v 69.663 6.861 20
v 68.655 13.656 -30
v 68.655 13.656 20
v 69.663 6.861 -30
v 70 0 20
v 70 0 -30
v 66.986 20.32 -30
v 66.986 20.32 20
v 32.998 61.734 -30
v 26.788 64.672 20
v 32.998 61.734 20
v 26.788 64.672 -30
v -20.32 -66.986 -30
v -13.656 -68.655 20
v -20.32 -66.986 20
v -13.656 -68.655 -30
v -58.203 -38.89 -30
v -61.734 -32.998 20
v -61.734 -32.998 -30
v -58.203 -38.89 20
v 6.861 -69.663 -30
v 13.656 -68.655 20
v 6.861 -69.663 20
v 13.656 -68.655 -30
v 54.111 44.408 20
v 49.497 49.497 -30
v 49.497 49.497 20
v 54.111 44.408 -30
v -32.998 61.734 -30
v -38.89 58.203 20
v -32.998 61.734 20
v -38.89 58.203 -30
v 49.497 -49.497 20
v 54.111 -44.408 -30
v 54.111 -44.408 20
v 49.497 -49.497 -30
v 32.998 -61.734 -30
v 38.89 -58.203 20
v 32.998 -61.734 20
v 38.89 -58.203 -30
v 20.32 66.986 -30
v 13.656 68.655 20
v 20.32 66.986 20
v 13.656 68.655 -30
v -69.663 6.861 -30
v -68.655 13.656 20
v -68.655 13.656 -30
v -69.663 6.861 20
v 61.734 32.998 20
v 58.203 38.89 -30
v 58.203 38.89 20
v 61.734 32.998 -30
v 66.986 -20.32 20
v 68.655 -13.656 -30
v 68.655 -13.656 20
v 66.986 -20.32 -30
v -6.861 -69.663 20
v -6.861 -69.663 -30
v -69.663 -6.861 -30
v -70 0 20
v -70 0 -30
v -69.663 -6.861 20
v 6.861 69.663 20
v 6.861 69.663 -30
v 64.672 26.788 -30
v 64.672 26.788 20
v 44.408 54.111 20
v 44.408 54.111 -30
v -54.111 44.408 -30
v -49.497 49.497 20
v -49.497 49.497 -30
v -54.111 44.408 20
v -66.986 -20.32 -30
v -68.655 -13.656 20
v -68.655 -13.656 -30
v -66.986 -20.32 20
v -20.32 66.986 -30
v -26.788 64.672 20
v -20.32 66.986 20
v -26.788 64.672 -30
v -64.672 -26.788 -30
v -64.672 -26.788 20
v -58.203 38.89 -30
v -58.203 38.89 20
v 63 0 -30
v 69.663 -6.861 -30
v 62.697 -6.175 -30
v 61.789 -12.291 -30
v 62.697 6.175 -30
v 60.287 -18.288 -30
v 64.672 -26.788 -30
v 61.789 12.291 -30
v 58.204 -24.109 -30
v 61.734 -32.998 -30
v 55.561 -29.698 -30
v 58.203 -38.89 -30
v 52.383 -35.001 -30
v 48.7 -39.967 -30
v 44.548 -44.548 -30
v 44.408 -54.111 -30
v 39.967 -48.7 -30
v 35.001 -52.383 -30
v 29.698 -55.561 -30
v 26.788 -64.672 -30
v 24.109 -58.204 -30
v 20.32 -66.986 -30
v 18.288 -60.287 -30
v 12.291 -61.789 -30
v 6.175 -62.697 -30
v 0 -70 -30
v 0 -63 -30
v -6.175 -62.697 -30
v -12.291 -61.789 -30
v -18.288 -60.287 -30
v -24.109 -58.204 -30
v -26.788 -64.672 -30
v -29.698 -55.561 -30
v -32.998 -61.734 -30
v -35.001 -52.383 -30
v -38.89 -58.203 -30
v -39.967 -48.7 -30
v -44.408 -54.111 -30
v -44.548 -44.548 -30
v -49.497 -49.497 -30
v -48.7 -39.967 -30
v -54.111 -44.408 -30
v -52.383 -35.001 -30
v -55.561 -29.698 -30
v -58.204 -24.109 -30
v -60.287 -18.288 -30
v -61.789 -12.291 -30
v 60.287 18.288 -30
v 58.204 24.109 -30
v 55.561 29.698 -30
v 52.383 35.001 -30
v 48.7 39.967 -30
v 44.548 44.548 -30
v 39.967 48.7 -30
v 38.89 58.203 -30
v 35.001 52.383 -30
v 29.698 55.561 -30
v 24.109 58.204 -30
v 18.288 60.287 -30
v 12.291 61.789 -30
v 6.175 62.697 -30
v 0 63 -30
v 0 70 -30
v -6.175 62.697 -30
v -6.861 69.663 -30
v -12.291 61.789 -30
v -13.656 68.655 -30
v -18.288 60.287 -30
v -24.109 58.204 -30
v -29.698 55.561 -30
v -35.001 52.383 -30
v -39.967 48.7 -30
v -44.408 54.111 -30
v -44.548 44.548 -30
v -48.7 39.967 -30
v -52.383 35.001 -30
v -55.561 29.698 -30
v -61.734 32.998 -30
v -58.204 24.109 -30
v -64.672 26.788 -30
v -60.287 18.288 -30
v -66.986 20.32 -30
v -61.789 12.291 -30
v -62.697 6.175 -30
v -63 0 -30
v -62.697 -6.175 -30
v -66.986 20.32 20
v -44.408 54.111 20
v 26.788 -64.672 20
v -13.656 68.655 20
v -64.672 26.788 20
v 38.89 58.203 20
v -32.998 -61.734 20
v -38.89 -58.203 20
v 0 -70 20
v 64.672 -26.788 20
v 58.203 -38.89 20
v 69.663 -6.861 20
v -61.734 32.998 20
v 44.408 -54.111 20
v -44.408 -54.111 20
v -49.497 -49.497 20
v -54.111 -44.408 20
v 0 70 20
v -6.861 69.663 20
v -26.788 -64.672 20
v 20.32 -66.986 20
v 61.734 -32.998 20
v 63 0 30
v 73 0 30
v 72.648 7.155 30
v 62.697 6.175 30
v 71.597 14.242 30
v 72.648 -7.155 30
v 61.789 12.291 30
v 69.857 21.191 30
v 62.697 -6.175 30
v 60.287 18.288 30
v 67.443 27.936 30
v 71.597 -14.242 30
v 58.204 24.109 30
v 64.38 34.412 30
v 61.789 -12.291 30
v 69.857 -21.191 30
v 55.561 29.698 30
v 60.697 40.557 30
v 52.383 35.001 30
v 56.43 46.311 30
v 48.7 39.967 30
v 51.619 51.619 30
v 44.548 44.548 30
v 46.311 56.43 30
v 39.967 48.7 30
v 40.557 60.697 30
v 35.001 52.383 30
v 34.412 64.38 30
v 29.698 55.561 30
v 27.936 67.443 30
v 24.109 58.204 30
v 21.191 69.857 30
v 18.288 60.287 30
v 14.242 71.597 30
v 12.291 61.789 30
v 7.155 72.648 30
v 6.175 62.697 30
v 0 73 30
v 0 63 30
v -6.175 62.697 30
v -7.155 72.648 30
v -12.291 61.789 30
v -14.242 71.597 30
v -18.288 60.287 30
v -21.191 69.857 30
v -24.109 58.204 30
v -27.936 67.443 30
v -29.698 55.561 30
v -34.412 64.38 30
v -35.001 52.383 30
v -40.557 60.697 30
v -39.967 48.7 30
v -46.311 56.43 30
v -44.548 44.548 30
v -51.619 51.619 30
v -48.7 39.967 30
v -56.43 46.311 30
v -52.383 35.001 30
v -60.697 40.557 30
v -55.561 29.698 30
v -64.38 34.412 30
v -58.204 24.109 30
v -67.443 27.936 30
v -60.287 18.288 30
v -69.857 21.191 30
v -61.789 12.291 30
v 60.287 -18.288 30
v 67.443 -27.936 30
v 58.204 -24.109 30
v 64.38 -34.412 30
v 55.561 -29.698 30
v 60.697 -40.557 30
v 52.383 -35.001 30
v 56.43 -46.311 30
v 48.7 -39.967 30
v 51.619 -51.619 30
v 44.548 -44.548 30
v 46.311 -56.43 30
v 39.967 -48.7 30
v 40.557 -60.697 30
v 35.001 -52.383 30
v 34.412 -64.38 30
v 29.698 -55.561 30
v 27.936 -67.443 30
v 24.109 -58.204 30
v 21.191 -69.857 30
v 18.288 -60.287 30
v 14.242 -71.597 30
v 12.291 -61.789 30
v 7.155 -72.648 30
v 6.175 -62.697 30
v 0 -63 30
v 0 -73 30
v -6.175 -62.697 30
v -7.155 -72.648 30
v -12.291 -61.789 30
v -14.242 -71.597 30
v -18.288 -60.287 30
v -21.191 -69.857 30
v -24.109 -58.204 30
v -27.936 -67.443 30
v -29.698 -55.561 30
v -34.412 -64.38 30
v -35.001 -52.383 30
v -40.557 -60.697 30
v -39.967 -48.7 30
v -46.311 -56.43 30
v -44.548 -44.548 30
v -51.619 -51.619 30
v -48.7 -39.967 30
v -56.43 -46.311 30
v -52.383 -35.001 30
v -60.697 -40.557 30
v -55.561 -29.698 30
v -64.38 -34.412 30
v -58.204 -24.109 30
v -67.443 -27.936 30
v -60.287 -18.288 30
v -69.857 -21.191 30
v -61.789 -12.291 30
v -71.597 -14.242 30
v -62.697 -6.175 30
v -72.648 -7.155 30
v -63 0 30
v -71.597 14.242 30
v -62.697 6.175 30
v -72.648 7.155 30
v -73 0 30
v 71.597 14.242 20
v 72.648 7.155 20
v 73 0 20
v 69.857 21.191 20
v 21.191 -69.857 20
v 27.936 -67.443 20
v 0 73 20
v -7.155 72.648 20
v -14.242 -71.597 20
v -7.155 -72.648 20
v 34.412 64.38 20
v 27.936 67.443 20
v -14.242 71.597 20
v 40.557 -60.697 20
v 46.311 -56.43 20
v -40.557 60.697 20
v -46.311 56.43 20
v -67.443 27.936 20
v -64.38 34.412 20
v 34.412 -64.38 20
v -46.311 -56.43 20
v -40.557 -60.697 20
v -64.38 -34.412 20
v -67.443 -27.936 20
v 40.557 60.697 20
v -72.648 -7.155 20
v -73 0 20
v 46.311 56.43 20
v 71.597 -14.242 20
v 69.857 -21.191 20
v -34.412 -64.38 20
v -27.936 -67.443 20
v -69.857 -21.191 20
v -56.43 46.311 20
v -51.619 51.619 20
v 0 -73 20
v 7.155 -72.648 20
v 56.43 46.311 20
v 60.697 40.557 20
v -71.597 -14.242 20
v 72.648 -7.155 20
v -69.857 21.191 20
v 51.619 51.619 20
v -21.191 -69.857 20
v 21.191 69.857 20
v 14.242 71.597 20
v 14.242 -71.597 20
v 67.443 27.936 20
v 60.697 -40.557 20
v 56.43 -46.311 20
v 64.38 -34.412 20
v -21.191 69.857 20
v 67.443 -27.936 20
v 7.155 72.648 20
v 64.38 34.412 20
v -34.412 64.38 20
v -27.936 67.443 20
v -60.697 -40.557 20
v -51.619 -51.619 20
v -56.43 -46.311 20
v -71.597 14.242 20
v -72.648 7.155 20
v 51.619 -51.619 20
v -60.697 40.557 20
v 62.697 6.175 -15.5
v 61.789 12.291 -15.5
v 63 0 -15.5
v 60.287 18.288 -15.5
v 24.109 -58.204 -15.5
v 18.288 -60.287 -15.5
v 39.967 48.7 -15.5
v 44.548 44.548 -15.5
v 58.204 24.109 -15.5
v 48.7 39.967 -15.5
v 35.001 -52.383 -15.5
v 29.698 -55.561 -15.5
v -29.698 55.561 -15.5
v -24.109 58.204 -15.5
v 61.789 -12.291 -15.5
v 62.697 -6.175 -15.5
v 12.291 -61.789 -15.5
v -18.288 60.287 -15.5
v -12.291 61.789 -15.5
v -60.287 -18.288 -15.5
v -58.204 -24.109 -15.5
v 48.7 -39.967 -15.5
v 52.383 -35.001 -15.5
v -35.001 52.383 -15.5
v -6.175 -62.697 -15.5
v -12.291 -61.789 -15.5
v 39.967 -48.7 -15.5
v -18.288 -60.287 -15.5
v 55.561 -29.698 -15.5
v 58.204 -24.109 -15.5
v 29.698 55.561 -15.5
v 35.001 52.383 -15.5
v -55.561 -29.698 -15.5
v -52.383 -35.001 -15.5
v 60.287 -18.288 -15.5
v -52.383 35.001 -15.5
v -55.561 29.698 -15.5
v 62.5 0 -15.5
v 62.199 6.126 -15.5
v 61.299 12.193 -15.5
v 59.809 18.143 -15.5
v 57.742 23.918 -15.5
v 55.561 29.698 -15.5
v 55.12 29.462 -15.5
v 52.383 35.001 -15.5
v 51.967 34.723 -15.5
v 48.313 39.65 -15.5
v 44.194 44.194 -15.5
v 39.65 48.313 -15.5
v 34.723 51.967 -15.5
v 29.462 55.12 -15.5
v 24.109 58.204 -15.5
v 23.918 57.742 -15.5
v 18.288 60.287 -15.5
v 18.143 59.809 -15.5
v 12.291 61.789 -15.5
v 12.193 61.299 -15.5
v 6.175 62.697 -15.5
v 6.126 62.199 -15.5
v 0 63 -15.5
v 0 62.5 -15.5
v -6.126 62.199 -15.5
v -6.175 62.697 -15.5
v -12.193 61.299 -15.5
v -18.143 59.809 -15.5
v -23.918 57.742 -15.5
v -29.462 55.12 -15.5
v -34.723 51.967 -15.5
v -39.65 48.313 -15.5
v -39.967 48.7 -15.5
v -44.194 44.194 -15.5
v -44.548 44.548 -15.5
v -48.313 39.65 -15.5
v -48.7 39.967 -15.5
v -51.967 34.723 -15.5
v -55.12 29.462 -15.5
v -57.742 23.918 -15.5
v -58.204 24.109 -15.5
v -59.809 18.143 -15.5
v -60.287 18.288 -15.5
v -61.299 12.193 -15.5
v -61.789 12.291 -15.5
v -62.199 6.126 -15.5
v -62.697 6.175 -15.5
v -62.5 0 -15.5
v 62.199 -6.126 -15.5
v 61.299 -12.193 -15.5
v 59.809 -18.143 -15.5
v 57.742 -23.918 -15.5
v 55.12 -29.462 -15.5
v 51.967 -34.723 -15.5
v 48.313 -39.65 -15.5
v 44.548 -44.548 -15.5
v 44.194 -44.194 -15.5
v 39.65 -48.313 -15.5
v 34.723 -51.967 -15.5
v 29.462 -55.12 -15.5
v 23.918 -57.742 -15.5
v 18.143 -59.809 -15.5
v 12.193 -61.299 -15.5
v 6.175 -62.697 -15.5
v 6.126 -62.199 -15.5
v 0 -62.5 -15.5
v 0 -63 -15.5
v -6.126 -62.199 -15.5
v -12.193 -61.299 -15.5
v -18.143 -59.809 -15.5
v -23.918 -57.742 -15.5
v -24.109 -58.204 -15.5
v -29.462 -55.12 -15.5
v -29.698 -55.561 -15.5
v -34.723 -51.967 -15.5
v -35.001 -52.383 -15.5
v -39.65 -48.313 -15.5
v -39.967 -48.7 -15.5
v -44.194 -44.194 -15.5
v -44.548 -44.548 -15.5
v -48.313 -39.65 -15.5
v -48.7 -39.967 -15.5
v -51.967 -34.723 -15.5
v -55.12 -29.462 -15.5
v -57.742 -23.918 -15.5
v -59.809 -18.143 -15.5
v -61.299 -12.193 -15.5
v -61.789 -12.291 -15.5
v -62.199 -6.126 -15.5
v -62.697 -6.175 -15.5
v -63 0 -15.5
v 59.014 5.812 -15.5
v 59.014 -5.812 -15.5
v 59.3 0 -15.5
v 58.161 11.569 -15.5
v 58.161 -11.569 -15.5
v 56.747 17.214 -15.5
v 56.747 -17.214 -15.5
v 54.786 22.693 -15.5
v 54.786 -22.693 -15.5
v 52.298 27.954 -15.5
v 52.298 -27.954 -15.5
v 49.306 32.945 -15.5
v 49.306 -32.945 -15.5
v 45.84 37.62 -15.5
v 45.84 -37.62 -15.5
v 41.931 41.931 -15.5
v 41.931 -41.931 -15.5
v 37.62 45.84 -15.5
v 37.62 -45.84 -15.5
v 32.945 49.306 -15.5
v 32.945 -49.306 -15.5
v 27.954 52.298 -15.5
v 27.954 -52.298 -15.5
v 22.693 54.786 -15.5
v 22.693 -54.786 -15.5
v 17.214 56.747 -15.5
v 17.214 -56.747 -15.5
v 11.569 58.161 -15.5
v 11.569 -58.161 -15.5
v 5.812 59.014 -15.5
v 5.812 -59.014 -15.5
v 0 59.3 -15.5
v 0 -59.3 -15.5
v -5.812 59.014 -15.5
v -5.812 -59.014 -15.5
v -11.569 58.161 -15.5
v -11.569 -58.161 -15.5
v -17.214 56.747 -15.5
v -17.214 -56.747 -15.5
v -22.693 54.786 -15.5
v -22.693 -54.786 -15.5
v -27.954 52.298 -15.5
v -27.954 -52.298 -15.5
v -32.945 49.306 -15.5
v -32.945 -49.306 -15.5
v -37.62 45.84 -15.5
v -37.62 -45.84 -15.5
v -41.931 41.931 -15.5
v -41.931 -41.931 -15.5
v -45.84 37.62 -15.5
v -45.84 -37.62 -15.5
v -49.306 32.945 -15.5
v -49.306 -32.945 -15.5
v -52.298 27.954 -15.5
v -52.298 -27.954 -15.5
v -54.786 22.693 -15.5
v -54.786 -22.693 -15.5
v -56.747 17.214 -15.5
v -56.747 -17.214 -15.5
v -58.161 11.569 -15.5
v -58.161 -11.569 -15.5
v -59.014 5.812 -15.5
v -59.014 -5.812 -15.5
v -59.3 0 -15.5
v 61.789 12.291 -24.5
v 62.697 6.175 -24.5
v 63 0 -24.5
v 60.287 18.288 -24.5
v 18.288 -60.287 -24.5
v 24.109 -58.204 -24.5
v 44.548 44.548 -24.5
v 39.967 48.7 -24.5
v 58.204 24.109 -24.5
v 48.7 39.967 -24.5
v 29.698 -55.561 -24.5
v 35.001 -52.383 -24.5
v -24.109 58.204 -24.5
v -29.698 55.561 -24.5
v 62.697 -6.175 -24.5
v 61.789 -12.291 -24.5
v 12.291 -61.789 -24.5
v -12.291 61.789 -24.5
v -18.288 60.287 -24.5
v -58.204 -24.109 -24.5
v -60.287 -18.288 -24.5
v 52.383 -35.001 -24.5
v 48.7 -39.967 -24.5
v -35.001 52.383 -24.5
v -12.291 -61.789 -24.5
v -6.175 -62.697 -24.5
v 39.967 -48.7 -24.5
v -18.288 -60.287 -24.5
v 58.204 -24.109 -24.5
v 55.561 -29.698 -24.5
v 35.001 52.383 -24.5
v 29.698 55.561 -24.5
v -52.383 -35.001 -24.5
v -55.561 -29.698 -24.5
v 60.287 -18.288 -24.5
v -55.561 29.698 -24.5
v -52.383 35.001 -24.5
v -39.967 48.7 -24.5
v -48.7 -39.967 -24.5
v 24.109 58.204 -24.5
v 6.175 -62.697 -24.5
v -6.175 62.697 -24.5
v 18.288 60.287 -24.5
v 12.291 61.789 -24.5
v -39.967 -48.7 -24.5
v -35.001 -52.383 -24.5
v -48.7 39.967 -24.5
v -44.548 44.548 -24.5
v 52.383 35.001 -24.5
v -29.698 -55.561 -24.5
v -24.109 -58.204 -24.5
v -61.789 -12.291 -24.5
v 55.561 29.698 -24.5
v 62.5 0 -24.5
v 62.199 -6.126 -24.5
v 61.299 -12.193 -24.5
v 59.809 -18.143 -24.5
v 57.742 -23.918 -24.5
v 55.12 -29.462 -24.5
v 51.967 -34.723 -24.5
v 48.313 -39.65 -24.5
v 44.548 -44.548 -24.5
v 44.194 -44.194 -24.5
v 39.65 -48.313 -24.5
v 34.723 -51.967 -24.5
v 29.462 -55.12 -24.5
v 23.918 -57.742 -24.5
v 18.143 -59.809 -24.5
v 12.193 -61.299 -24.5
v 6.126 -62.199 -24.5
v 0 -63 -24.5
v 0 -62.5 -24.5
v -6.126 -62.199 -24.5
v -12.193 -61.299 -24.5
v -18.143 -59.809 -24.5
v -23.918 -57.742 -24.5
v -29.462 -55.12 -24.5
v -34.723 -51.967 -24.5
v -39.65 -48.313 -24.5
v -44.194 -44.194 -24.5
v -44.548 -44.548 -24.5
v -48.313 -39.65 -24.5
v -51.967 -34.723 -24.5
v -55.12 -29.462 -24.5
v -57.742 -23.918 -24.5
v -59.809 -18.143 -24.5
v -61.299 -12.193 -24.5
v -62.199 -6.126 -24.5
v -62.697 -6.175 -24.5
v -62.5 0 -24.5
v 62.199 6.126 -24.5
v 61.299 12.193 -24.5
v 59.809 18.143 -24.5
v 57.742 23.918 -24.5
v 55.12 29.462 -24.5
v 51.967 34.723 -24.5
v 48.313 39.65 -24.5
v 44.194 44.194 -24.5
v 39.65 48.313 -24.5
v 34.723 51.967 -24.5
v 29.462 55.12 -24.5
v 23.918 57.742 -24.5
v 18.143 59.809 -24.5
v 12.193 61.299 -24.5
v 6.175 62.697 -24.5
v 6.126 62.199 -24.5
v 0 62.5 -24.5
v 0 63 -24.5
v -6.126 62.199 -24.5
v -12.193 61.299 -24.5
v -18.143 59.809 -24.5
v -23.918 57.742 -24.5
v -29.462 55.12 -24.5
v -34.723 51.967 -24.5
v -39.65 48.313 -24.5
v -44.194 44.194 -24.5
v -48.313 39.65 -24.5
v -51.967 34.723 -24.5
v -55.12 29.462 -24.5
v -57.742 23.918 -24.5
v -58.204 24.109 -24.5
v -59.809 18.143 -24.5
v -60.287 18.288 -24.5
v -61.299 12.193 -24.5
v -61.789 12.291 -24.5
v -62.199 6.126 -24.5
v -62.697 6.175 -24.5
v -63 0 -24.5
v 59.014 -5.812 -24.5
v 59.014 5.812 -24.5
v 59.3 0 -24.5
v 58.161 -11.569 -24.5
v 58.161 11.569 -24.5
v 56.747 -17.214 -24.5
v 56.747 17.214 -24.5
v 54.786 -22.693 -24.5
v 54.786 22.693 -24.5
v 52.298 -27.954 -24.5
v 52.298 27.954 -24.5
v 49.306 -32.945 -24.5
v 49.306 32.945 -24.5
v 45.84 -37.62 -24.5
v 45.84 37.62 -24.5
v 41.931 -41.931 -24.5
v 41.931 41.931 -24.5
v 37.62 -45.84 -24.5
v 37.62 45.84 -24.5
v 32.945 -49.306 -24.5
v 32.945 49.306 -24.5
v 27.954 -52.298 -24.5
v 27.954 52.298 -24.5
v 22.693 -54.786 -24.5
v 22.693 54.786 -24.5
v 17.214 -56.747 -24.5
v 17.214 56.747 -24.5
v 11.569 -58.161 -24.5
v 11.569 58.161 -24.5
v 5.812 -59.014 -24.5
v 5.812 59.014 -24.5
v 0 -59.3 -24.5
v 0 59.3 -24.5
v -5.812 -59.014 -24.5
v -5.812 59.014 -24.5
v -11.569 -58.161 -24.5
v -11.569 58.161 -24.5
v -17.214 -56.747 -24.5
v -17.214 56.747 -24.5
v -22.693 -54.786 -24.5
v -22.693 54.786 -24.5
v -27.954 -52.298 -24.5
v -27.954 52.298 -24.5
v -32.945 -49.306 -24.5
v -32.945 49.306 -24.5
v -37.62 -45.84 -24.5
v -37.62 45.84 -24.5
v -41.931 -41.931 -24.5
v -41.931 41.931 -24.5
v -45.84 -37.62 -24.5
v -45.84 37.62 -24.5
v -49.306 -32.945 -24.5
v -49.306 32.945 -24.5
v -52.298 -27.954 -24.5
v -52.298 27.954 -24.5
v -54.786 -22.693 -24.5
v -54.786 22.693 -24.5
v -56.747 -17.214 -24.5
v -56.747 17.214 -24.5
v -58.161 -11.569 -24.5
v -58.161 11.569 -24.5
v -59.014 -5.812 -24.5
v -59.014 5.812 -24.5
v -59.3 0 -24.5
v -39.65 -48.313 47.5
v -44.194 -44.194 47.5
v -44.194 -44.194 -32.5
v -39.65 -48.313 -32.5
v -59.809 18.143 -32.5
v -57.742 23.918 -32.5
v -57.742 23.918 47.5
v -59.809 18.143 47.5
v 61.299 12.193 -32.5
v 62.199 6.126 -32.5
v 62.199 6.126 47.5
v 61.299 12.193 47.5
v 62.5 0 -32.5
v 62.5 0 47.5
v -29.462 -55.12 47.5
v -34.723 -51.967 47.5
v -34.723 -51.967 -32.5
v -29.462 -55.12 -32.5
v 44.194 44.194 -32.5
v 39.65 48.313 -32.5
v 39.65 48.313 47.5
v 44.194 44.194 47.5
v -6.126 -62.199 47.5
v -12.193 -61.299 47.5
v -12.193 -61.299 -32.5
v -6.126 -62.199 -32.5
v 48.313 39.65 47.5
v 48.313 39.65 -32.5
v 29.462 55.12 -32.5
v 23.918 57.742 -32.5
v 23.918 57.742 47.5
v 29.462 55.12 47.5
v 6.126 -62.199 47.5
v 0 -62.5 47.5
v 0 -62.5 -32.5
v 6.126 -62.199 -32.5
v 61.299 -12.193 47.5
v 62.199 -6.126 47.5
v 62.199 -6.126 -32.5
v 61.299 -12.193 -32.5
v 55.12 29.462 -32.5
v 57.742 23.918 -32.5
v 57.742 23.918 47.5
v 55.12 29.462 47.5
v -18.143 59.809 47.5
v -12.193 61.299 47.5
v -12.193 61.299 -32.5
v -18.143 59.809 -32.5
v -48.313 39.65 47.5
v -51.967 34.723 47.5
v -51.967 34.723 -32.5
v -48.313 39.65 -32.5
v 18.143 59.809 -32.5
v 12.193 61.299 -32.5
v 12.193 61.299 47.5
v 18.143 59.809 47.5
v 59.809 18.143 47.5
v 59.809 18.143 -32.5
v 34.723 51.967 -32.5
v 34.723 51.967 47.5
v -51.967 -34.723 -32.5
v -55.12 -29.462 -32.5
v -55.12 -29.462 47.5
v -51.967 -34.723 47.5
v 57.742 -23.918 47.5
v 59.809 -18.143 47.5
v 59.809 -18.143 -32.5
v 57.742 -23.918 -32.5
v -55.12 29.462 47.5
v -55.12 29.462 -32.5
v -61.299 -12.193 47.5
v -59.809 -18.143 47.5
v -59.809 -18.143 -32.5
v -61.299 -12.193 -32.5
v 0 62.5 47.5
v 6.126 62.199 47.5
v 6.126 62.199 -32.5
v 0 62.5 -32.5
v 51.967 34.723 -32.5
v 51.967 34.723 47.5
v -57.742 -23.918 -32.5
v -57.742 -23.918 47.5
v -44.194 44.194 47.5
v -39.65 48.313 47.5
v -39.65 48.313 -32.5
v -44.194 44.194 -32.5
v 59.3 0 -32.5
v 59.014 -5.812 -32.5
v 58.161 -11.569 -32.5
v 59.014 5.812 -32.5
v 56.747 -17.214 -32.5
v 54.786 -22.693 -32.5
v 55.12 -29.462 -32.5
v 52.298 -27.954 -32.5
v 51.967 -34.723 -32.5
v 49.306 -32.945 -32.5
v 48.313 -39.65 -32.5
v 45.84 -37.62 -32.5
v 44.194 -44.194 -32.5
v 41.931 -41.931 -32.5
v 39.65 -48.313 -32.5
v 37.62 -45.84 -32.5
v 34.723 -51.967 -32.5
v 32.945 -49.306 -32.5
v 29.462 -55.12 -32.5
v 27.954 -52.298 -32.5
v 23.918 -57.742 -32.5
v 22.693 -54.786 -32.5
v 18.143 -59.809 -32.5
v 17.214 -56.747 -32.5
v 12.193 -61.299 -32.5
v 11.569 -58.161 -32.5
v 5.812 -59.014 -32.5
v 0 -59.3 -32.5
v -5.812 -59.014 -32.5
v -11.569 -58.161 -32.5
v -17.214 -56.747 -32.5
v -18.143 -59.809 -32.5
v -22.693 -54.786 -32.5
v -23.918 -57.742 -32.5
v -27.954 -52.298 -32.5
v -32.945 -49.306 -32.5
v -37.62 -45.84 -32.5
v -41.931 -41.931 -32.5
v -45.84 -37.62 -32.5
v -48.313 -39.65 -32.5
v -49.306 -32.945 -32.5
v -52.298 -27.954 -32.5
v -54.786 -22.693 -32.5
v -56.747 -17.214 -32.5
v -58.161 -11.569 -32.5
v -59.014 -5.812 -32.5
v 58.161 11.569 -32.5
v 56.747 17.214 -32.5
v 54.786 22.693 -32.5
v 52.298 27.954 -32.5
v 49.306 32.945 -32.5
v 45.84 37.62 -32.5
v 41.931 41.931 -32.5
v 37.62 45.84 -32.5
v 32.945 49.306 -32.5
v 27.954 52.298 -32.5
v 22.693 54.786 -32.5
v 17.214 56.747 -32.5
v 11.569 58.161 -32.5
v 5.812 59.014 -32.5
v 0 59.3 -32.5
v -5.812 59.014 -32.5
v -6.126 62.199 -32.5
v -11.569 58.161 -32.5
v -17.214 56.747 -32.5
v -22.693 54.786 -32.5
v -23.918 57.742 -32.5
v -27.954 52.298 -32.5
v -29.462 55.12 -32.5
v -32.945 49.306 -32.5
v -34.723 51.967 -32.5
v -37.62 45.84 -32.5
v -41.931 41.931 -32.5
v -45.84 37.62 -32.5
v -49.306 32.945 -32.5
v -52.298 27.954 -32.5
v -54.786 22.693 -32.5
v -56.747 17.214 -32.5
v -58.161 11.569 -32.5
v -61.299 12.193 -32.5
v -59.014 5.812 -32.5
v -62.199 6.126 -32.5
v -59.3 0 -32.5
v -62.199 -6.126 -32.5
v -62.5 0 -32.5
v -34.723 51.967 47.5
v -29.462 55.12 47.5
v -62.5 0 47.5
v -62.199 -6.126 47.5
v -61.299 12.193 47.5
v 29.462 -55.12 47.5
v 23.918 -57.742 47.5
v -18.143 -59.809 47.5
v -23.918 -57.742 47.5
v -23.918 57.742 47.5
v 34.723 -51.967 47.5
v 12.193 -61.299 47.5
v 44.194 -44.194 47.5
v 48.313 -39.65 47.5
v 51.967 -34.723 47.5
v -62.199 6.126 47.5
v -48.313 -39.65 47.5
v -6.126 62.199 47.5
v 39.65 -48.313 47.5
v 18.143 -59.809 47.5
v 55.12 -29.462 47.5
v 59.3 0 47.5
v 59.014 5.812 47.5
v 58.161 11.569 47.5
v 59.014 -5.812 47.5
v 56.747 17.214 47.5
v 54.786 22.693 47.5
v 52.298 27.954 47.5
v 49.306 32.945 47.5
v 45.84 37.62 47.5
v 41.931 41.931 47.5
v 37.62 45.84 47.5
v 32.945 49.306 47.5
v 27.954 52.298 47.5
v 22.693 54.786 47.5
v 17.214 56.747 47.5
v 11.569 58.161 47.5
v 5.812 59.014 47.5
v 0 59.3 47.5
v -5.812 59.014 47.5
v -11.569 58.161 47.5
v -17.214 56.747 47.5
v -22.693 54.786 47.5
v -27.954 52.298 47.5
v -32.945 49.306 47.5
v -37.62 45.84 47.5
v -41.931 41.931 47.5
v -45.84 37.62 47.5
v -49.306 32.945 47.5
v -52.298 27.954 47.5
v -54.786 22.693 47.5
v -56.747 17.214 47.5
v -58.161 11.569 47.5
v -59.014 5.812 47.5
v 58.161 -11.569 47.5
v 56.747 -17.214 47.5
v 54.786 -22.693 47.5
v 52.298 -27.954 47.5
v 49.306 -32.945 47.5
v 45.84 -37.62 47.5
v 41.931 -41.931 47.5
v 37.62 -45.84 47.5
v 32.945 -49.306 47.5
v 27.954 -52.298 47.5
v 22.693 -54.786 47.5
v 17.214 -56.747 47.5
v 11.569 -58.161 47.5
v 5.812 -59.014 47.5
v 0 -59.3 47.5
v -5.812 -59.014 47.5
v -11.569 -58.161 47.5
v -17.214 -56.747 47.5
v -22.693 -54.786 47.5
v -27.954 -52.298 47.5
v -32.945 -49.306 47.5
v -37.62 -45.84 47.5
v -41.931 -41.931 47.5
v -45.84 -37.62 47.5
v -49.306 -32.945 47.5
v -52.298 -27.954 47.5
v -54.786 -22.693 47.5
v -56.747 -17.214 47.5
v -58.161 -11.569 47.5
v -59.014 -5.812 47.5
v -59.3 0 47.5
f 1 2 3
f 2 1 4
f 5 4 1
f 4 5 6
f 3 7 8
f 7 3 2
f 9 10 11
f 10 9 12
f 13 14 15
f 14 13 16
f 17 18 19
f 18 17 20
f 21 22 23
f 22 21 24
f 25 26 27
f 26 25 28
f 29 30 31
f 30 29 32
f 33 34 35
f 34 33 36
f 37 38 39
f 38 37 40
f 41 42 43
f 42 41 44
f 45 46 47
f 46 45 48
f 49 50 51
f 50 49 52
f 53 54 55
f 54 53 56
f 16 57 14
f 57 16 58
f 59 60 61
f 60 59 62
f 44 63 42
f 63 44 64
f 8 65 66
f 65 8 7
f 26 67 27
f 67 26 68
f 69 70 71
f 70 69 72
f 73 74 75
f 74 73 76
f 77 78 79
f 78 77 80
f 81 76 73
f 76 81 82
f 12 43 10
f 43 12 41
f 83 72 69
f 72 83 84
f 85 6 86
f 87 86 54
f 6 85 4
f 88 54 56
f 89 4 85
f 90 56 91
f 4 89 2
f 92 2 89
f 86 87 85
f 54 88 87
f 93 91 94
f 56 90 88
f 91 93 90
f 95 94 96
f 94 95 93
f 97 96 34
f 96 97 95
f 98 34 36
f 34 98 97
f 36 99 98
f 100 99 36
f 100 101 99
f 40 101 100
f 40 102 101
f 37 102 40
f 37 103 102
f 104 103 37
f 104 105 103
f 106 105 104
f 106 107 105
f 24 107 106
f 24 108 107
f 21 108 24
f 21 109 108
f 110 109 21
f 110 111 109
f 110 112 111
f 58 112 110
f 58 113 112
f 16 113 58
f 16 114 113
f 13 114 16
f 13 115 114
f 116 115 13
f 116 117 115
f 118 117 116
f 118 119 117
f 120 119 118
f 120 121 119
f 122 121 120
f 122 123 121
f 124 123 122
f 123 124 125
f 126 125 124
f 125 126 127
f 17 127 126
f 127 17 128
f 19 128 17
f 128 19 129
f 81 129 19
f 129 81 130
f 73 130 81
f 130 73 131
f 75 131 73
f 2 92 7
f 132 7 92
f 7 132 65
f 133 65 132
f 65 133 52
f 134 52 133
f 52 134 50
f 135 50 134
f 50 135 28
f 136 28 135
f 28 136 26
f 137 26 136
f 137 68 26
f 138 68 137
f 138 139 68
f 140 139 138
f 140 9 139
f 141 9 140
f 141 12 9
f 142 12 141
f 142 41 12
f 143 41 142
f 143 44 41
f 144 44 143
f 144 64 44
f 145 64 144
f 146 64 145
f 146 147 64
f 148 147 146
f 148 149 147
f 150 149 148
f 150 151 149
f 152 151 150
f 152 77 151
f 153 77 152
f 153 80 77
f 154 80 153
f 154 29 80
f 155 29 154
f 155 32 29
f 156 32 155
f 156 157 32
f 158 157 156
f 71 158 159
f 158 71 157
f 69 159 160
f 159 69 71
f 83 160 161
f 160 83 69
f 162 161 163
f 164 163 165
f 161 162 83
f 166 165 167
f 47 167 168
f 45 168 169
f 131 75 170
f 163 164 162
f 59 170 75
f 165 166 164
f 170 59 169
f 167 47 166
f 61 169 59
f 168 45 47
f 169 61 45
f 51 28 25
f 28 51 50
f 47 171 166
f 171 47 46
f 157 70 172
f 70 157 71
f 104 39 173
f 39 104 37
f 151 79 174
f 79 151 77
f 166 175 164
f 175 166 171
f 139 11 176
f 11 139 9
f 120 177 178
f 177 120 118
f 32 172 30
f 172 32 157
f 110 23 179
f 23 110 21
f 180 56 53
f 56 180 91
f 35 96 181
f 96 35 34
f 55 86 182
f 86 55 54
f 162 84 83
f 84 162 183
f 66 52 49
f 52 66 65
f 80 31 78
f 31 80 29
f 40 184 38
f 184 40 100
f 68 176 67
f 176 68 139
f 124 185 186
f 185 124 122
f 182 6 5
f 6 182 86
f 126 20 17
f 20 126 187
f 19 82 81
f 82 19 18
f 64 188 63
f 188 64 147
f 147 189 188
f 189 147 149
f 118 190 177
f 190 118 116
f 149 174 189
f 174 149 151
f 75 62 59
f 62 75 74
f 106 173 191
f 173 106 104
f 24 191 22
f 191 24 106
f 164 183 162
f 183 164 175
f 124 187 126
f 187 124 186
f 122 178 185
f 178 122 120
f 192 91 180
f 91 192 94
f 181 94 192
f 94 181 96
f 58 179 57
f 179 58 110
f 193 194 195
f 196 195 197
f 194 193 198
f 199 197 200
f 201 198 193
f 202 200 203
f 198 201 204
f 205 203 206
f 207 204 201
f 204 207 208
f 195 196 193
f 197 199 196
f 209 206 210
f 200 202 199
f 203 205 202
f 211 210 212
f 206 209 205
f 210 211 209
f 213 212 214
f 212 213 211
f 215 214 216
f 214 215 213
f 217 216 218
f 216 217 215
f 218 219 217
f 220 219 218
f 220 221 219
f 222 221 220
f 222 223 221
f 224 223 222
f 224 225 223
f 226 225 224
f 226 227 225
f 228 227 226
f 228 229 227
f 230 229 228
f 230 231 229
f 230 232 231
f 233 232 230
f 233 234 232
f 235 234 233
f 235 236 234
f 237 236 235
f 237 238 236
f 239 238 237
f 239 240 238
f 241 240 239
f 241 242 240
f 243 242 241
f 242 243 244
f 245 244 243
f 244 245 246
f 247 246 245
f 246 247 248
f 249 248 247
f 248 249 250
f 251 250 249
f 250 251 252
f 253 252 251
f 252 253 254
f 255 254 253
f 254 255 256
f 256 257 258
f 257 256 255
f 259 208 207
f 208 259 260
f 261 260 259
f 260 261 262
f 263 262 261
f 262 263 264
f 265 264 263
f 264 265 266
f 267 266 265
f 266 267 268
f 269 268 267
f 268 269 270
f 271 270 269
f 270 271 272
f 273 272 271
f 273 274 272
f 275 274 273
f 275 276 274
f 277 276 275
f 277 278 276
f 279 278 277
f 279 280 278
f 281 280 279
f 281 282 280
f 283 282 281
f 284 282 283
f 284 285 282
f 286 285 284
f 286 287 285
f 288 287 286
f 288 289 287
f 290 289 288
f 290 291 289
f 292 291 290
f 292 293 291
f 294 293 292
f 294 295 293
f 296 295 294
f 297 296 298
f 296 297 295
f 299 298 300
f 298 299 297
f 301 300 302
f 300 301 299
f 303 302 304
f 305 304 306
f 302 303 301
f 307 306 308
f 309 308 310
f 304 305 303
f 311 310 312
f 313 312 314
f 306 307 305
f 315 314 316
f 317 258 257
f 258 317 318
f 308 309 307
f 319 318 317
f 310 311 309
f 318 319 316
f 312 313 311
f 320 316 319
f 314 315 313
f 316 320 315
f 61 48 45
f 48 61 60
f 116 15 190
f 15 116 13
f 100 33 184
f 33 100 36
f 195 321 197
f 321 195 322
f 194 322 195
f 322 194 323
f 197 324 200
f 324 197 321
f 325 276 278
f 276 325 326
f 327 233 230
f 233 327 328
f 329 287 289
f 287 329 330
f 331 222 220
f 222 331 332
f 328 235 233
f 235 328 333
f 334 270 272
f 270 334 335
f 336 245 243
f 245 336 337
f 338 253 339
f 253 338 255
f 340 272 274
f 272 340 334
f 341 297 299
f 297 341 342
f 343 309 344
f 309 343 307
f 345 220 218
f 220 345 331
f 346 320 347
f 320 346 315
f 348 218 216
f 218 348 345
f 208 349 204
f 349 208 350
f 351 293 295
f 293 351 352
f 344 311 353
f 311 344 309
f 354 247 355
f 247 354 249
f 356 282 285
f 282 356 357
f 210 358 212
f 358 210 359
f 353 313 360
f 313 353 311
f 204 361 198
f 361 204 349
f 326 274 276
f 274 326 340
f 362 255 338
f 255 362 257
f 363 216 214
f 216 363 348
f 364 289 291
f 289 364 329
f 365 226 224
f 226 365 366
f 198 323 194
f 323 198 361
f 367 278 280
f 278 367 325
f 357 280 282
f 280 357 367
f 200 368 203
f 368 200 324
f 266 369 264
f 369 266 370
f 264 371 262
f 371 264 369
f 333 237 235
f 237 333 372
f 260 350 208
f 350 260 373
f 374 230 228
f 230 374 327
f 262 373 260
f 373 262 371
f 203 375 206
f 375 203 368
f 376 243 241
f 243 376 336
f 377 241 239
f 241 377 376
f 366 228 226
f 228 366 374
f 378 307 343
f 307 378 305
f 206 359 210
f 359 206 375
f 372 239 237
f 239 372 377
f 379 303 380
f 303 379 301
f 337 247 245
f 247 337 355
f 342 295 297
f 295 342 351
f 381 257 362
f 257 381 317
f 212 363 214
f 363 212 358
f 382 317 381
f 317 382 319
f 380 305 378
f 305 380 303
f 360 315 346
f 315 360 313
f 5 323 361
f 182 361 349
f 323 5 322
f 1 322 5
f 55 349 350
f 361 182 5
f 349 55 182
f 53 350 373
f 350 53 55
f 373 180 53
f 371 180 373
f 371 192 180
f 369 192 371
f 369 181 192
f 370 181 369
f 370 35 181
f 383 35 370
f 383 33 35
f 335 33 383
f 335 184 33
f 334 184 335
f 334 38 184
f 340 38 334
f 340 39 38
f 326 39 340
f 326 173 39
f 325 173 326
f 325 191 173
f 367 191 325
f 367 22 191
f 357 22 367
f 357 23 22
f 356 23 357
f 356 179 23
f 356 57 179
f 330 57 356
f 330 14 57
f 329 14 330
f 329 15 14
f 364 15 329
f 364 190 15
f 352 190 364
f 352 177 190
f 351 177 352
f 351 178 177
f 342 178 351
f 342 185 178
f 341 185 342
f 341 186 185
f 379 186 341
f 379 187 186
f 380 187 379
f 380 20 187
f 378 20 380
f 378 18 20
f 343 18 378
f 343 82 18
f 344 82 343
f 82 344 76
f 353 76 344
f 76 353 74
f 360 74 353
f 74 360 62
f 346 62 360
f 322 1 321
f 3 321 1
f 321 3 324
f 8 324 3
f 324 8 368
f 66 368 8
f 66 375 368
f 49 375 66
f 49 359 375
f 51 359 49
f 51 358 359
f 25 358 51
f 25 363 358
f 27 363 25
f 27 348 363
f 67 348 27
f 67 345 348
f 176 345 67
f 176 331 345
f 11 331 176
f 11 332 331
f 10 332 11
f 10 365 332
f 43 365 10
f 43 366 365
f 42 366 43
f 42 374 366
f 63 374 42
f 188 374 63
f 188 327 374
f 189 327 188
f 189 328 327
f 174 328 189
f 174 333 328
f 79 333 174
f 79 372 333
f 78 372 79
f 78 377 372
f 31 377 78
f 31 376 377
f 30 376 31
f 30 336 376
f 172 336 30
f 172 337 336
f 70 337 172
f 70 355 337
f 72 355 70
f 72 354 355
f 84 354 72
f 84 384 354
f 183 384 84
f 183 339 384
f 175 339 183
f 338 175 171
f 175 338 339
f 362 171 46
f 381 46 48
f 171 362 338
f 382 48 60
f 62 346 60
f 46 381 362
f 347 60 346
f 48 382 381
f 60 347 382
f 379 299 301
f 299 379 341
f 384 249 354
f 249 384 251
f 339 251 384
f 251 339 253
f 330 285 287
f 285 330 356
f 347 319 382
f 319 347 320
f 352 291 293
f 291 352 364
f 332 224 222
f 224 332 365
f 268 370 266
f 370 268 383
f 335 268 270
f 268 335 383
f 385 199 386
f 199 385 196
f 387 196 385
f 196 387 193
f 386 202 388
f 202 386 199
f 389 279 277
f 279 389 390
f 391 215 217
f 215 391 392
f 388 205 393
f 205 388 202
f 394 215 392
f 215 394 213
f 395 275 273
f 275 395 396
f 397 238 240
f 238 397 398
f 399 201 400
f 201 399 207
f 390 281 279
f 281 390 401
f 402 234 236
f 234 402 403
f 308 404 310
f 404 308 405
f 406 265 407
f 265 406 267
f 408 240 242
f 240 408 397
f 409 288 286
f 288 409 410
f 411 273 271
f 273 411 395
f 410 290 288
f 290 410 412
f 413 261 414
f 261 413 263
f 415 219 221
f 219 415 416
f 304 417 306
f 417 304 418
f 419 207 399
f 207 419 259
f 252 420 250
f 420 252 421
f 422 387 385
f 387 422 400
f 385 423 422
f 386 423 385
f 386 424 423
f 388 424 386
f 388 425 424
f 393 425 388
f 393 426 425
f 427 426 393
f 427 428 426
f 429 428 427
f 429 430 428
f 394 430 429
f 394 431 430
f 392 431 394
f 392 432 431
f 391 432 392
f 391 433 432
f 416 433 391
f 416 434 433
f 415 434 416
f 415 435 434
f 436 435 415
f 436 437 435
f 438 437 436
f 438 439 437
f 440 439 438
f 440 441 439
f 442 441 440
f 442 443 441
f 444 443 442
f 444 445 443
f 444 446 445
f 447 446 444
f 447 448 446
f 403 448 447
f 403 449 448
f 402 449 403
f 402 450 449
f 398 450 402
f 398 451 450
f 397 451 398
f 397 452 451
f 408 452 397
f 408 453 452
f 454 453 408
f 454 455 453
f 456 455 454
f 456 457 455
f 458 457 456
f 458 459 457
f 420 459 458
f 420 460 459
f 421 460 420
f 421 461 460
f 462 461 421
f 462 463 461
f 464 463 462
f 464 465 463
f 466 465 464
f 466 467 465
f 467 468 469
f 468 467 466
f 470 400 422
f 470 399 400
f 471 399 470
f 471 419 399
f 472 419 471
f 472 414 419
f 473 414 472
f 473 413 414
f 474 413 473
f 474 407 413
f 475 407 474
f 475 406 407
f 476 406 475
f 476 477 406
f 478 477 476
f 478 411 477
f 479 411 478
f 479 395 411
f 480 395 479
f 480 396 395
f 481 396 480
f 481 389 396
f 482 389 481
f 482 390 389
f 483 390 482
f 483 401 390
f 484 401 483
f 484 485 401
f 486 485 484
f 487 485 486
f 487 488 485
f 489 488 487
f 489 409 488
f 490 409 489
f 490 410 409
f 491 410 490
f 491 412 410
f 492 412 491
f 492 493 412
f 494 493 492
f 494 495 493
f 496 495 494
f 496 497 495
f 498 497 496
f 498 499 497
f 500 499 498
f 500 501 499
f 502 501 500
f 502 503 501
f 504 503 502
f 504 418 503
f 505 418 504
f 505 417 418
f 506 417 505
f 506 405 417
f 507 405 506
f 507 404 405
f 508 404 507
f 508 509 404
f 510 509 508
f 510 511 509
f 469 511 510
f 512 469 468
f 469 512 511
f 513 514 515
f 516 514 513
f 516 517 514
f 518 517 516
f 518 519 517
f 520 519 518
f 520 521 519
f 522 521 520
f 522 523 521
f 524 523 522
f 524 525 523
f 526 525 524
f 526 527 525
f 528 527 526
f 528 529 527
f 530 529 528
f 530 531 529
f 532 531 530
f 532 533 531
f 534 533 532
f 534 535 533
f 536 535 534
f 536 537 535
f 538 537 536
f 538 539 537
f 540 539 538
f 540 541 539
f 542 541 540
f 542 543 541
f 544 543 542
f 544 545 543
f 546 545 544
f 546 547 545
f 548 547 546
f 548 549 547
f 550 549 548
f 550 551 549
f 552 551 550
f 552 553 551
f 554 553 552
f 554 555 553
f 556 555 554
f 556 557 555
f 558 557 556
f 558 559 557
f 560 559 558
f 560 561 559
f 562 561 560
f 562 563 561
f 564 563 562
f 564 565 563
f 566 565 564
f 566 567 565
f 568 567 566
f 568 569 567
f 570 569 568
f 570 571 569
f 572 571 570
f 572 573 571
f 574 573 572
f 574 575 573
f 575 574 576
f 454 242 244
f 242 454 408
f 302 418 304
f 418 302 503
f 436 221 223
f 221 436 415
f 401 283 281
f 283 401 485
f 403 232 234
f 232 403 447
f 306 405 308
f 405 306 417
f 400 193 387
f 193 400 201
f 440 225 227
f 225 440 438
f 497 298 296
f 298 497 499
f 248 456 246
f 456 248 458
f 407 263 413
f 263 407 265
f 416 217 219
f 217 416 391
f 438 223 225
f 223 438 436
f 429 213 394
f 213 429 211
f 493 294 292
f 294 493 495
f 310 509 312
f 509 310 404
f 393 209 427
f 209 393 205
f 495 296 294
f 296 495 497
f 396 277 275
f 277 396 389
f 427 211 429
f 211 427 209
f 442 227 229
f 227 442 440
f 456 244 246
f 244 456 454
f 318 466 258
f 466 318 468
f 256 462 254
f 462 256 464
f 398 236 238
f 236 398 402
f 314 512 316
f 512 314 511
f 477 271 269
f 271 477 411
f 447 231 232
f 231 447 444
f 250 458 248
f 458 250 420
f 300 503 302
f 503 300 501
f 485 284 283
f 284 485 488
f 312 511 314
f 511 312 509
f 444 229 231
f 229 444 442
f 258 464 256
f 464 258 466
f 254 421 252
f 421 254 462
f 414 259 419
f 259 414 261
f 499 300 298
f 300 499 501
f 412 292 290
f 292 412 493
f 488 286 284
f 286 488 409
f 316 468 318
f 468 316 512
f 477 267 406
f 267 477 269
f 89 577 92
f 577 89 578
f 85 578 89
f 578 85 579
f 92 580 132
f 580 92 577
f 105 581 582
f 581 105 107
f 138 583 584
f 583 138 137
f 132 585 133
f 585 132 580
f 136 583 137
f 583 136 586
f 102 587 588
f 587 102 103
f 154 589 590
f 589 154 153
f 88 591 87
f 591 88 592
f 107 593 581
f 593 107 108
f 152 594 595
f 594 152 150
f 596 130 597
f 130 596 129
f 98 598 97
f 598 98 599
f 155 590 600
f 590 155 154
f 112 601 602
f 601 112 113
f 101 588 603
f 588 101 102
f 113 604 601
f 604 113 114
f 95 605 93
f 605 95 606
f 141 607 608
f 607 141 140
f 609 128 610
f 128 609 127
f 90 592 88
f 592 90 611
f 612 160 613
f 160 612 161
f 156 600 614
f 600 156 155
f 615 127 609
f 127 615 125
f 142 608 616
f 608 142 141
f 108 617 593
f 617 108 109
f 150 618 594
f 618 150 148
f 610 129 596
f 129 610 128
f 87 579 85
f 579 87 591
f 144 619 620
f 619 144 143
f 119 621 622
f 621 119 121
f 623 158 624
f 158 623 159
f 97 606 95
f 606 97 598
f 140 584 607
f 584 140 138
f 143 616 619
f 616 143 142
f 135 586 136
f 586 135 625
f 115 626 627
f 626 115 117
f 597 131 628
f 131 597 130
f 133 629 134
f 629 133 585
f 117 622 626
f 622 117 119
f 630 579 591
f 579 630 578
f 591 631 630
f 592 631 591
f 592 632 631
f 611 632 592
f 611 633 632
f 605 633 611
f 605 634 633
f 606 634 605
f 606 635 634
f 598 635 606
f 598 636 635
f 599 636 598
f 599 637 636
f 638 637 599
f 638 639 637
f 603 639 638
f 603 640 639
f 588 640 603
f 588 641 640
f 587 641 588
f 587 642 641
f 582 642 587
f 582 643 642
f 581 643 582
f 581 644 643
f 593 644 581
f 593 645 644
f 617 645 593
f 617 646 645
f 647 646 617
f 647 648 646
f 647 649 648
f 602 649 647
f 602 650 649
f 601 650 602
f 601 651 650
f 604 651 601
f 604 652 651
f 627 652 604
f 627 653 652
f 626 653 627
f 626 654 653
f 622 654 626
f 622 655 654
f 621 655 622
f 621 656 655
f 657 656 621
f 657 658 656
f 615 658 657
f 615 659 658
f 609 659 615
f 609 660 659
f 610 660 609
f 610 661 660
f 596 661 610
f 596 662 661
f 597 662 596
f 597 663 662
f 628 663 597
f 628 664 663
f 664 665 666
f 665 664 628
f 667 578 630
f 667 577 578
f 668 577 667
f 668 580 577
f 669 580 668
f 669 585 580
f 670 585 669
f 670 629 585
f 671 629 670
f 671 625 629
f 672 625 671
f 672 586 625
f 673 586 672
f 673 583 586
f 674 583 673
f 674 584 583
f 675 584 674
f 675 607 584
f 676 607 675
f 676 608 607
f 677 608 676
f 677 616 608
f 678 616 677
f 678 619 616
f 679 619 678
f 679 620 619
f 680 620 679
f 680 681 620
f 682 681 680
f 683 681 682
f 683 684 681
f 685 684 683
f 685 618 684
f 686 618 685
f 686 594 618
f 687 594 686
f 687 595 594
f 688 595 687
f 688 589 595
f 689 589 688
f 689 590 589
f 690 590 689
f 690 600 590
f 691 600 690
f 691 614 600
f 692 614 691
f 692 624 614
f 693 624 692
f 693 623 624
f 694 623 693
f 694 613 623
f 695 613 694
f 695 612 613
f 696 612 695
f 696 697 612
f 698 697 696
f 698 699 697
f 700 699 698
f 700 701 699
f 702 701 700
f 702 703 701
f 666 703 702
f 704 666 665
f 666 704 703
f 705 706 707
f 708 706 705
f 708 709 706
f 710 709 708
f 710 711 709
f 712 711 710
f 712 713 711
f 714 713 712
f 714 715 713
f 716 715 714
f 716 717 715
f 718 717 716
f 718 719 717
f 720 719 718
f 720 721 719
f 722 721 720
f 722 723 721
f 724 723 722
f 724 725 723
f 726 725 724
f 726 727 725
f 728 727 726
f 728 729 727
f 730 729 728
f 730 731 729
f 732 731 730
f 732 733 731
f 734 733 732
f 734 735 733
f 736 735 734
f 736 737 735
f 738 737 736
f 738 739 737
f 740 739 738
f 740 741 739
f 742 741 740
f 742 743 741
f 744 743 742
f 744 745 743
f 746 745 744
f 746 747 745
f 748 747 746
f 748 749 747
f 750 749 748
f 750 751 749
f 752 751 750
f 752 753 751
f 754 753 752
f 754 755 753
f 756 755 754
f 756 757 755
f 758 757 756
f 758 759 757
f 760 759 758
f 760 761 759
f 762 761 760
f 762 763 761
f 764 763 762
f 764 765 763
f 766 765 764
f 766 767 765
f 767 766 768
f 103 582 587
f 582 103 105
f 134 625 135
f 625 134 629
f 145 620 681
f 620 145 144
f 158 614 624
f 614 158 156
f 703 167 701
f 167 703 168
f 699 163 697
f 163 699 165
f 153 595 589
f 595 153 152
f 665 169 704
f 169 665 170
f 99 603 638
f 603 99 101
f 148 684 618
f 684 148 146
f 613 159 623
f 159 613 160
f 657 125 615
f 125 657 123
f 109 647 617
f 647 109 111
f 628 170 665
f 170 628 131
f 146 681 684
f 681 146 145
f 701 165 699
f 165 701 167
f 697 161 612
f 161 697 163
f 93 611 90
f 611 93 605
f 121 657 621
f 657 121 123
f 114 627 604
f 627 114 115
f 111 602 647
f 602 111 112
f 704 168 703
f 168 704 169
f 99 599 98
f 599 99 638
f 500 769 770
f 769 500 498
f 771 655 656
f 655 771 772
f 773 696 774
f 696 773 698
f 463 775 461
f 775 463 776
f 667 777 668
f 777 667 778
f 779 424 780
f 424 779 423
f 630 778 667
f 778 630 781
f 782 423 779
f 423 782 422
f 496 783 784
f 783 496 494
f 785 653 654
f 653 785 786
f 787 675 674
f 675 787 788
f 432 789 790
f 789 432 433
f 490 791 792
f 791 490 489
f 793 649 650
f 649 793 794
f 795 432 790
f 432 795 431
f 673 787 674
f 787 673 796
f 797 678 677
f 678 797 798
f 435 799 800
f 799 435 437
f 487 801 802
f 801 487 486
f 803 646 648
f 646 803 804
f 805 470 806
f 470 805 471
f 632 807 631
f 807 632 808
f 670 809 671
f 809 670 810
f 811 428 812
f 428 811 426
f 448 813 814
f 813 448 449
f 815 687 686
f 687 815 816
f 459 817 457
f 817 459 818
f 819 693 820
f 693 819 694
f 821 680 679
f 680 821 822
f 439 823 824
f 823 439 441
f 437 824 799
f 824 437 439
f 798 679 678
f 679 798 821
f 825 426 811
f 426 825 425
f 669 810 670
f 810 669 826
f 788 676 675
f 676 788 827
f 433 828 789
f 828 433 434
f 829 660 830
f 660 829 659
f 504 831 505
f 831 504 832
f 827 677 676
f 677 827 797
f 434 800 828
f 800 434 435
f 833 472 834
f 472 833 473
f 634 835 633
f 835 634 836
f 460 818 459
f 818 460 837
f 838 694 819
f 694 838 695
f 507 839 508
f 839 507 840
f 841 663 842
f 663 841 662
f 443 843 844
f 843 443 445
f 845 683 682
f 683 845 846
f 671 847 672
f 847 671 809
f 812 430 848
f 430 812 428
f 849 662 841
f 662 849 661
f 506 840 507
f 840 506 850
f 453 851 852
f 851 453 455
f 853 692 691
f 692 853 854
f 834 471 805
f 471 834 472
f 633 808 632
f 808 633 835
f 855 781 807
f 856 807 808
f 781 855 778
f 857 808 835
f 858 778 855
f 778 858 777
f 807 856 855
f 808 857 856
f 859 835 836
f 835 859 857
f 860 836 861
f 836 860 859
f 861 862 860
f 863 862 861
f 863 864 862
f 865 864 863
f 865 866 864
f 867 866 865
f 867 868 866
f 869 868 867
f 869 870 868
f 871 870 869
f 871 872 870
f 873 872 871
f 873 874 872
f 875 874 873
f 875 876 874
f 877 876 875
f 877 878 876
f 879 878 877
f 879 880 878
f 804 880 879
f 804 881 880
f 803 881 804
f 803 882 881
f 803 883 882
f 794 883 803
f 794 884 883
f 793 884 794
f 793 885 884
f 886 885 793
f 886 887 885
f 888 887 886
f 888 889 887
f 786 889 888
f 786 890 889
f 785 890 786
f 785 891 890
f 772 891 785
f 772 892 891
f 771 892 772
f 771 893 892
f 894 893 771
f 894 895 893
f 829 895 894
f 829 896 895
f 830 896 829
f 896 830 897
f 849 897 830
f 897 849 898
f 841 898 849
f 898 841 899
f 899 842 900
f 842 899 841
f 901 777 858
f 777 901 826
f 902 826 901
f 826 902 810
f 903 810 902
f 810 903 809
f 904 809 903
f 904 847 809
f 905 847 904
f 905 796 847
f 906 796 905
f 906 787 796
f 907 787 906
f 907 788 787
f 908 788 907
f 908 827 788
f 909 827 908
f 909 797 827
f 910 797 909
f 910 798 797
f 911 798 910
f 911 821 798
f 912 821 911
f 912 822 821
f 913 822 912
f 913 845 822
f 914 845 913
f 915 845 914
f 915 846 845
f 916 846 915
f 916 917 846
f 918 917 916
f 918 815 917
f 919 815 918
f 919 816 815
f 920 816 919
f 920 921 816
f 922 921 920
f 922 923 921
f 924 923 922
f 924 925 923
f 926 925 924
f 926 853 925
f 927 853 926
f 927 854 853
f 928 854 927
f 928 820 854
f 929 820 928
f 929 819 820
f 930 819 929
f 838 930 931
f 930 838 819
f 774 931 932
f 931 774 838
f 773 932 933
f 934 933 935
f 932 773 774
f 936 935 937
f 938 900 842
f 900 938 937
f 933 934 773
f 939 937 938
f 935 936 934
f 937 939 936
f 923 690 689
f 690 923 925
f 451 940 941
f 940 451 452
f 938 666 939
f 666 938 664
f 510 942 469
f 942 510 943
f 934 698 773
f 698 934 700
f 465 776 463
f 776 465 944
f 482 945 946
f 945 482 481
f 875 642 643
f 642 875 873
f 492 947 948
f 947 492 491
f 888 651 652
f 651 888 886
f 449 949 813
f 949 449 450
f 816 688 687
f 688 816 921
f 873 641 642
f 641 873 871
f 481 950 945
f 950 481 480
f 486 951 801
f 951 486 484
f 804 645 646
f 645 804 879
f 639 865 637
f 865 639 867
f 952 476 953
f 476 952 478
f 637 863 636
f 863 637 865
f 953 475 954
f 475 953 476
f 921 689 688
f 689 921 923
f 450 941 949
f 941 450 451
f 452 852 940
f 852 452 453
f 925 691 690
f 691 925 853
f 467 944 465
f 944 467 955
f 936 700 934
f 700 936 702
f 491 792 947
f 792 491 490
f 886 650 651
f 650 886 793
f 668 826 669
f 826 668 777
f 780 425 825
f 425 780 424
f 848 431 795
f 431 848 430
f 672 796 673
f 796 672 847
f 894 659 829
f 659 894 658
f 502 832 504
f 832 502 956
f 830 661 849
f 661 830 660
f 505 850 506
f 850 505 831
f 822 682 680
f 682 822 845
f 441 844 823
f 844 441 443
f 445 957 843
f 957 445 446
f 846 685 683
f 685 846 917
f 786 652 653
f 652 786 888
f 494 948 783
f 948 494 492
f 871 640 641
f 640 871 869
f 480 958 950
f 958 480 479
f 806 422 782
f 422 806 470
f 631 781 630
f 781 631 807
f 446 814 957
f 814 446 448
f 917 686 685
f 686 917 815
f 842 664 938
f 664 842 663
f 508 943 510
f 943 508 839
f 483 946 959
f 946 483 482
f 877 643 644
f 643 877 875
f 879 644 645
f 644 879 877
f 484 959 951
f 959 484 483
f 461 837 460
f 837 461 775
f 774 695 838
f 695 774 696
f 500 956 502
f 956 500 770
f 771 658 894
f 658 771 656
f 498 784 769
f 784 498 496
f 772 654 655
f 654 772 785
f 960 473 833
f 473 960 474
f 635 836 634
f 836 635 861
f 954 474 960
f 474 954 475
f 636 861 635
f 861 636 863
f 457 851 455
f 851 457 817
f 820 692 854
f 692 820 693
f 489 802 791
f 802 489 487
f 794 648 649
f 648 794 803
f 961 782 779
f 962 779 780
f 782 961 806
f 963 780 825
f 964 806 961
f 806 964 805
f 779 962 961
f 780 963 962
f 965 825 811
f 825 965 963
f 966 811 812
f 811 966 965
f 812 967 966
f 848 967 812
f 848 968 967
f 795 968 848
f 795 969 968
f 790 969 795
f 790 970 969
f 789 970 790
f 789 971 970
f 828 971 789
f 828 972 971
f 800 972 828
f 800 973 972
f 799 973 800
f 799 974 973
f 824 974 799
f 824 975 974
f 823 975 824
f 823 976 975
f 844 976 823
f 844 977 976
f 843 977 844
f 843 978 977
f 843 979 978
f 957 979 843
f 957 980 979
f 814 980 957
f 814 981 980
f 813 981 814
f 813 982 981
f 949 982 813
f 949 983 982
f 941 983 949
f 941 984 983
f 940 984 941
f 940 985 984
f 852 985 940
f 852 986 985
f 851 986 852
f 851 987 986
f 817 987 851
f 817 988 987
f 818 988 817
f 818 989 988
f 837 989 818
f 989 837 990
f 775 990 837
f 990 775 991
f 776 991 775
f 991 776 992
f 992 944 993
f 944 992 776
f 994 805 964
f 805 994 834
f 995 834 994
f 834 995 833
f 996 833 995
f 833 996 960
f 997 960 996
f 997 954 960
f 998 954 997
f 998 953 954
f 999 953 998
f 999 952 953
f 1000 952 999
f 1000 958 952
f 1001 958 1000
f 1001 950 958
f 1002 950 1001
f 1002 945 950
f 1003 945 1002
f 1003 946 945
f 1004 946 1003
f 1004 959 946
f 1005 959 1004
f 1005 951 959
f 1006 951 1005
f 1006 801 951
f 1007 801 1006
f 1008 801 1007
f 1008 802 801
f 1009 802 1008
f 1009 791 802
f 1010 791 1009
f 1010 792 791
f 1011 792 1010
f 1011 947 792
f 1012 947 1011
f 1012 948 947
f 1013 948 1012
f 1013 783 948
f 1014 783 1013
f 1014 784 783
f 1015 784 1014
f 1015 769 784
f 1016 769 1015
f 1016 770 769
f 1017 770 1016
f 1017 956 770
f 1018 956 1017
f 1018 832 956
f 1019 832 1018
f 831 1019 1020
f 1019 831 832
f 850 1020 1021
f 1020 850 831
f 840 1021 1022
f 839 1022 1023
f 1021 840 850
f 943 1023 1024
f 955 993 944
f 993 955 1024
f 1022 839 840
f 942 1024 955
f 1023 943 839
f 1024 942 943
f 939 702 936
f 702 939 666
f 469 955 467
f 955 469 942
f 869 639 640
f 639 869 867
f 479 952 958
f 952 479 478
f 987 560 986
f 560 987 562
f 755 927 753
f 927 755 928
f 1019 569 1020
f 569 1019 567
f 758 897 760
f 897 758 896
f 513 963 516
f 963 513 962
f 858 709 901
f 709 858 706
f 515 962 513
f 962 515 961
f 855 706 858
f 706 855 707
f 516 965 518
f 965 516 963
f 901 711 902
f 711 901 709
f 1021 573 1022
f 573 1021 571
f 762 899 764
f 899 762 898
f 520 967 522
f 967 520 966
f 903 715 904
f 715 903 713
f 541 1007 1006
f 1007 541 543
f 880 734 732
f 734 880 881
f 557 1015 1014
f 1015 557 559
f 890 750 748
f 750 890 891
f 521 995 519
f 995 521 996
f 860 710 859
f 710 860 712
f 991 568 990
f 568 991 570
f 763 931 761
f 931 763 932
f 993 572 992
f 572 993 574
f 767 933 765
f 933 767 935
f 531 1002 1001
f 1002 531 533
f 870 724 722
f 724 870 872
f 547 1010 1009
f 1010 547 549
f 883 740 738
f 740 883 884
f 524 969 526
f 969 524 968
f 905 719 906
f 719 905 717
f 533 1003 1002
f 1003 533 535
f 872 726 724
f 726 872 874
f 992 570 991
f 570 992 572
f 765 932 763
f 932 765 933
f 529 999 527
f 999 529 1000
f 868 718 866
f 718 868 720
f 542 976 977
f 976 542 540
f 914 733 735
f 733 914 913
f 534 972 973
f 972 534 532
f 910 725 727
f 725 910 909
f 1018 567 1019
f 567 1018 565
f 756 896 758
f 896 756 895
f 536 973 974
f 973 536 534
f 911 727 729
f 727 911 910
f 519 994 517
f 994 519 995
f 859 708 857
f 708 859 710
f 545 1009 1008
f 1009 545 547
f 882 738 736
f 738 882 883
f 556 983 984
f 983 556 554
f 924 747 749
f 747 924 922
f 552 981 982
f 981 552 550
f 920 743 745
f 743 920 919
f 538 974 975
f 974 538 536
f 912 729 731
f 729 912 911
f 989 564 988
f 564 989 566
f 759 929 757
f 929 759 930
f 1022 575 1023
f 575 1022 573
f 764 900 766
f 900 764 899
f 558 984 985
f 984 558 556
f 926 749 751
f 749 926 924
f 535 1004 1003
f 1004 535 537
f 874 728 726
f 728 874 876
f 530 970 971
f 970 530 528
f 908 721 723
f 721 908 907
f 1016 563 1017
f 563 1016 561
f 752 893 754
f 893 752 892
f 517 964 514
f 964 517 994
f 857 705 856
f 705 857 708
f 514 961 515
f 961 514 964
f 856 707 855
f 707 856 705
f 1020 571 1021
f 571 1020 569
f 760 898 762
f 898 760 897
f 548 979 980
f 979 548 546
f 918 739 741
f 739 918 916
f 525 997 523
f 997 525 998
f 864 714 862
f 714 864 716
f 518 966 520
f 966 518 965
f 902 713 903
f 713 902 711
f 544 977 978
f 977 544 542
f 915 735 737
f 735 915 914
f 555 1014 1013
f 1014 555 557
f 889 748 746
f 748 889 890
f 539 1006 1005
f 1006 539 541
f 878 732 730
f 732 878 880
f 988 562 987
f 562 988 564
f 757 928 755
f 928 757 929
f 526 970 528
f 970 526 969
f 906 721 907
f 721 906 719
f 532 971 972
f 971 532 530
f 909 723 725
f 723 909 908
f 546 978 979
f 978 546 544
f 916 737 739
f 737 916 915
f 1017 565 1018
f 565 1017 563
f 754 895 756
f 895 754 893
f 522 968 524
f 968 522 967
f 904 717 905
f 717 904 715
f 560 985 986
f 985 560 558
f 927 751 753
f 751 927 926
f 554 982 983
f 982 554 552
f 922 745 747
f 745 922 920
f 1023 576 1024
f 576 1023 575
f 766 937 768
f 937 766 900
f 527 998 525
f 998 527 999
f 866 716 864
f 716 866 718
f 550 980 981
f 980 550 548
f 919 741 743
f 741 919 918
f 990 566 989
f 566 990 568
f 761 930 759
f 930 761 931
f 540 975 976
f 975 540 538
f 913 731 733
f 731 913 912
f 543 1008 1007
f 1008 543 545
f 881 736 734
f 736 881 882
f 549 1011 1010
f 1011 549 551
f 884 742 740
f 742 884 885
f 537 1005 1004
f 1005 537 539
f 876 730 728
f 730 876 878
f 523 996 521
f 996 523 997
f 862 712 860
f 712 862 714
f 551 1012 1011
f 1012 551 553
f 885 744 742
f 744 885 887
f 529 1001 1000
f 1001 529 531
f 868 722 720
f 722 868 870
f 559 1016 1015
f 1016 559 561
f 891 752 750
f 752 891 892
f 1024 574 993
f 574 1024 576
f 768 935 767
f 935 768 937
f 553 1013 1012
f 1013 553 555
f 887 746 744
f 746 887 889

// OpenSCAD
// Parameters
nominal_diameter = 125; //[60:250:1]
cap_outer_diameter = 140; //[100:280:1]
cap_total_height = 60; //[30:120:1]
socket_inner_diameter = 125; //[60:250:1]
socket_depth = 45; //[20:100:1]
cap_wall_thickness = 4; //[2:10:0.5]
end_face_thickness = 5; //[2:15:0.5]
clearance = 0.5; //[0.1:1.5:0.1]
grip_rim_radial = 3; //[1:8:0.5]
grip_rim_height = 10; //[4:25:1]
pipe_wall_thickness = 3.2; //[2:6:0.1]
pipe_length = 80; //[40:200:1]
overlap = 1; //[0.5:2:0.5]

// HT Pipe - complete geometry
module ht_pipe() {
  color([0.85, 0.85, 0.8]) {
    difference() {
      // Outer pipe
      translate([0, 0, cap_total_height/2 - socket_depth/2])
        cylinder(r=socket_inner_diameter/2, h=pipe_length, center=true, $fn=64);
      // Inner pipe
      translate([0, 0, cap_total_height/2 - socket_depth/2])
        cylinder(r=socket_inner_diameter/2 - pipe_wall_thickness, h=pipe_length + overlap, center=true, $fn=64);
    }
  }
}

// Cap with grip rim
module cap_with_rim() {
  union() {
    // Cap body
    translate([0, 0, 0])
      cylinder(r=cap_outer_diameter/2, h=cap_total_height, center=true, $fn=64);
    // Outer grip rim
    translate([0, 0, cap_total_height/2 - grip_rim_height/2])
      cylinder(r=cap_outer_diameter/2 + grip_rim_radial, h=grip_rim_height, center=true, $fn=64);
  }
}

// Cap shell
module cap_shell() {
  difference() {
    cap_with_rim();
    // Inner socket cavity
    translate([0, 0, cap_total_height/2 - socket_depth/2])
      cylinder(r=(socket_inner_diameter + 2*clearance)/2, h=socket_depth + overlap, center=true, $fn=64);
    // Pipe stop shoulder
    translate([0, 0, -cap_total_height/2 + end_face_thickness/2])
      cylinder(r=(socket_inner_diameter + 2*clearance)/2, h=end_face_thickness + overlap, center=true, $fn=64);
  }
}

// Assembly
module assembly() {
  union() {
    cap_shell();
    ht_pipe();
  }
}

assembly();
